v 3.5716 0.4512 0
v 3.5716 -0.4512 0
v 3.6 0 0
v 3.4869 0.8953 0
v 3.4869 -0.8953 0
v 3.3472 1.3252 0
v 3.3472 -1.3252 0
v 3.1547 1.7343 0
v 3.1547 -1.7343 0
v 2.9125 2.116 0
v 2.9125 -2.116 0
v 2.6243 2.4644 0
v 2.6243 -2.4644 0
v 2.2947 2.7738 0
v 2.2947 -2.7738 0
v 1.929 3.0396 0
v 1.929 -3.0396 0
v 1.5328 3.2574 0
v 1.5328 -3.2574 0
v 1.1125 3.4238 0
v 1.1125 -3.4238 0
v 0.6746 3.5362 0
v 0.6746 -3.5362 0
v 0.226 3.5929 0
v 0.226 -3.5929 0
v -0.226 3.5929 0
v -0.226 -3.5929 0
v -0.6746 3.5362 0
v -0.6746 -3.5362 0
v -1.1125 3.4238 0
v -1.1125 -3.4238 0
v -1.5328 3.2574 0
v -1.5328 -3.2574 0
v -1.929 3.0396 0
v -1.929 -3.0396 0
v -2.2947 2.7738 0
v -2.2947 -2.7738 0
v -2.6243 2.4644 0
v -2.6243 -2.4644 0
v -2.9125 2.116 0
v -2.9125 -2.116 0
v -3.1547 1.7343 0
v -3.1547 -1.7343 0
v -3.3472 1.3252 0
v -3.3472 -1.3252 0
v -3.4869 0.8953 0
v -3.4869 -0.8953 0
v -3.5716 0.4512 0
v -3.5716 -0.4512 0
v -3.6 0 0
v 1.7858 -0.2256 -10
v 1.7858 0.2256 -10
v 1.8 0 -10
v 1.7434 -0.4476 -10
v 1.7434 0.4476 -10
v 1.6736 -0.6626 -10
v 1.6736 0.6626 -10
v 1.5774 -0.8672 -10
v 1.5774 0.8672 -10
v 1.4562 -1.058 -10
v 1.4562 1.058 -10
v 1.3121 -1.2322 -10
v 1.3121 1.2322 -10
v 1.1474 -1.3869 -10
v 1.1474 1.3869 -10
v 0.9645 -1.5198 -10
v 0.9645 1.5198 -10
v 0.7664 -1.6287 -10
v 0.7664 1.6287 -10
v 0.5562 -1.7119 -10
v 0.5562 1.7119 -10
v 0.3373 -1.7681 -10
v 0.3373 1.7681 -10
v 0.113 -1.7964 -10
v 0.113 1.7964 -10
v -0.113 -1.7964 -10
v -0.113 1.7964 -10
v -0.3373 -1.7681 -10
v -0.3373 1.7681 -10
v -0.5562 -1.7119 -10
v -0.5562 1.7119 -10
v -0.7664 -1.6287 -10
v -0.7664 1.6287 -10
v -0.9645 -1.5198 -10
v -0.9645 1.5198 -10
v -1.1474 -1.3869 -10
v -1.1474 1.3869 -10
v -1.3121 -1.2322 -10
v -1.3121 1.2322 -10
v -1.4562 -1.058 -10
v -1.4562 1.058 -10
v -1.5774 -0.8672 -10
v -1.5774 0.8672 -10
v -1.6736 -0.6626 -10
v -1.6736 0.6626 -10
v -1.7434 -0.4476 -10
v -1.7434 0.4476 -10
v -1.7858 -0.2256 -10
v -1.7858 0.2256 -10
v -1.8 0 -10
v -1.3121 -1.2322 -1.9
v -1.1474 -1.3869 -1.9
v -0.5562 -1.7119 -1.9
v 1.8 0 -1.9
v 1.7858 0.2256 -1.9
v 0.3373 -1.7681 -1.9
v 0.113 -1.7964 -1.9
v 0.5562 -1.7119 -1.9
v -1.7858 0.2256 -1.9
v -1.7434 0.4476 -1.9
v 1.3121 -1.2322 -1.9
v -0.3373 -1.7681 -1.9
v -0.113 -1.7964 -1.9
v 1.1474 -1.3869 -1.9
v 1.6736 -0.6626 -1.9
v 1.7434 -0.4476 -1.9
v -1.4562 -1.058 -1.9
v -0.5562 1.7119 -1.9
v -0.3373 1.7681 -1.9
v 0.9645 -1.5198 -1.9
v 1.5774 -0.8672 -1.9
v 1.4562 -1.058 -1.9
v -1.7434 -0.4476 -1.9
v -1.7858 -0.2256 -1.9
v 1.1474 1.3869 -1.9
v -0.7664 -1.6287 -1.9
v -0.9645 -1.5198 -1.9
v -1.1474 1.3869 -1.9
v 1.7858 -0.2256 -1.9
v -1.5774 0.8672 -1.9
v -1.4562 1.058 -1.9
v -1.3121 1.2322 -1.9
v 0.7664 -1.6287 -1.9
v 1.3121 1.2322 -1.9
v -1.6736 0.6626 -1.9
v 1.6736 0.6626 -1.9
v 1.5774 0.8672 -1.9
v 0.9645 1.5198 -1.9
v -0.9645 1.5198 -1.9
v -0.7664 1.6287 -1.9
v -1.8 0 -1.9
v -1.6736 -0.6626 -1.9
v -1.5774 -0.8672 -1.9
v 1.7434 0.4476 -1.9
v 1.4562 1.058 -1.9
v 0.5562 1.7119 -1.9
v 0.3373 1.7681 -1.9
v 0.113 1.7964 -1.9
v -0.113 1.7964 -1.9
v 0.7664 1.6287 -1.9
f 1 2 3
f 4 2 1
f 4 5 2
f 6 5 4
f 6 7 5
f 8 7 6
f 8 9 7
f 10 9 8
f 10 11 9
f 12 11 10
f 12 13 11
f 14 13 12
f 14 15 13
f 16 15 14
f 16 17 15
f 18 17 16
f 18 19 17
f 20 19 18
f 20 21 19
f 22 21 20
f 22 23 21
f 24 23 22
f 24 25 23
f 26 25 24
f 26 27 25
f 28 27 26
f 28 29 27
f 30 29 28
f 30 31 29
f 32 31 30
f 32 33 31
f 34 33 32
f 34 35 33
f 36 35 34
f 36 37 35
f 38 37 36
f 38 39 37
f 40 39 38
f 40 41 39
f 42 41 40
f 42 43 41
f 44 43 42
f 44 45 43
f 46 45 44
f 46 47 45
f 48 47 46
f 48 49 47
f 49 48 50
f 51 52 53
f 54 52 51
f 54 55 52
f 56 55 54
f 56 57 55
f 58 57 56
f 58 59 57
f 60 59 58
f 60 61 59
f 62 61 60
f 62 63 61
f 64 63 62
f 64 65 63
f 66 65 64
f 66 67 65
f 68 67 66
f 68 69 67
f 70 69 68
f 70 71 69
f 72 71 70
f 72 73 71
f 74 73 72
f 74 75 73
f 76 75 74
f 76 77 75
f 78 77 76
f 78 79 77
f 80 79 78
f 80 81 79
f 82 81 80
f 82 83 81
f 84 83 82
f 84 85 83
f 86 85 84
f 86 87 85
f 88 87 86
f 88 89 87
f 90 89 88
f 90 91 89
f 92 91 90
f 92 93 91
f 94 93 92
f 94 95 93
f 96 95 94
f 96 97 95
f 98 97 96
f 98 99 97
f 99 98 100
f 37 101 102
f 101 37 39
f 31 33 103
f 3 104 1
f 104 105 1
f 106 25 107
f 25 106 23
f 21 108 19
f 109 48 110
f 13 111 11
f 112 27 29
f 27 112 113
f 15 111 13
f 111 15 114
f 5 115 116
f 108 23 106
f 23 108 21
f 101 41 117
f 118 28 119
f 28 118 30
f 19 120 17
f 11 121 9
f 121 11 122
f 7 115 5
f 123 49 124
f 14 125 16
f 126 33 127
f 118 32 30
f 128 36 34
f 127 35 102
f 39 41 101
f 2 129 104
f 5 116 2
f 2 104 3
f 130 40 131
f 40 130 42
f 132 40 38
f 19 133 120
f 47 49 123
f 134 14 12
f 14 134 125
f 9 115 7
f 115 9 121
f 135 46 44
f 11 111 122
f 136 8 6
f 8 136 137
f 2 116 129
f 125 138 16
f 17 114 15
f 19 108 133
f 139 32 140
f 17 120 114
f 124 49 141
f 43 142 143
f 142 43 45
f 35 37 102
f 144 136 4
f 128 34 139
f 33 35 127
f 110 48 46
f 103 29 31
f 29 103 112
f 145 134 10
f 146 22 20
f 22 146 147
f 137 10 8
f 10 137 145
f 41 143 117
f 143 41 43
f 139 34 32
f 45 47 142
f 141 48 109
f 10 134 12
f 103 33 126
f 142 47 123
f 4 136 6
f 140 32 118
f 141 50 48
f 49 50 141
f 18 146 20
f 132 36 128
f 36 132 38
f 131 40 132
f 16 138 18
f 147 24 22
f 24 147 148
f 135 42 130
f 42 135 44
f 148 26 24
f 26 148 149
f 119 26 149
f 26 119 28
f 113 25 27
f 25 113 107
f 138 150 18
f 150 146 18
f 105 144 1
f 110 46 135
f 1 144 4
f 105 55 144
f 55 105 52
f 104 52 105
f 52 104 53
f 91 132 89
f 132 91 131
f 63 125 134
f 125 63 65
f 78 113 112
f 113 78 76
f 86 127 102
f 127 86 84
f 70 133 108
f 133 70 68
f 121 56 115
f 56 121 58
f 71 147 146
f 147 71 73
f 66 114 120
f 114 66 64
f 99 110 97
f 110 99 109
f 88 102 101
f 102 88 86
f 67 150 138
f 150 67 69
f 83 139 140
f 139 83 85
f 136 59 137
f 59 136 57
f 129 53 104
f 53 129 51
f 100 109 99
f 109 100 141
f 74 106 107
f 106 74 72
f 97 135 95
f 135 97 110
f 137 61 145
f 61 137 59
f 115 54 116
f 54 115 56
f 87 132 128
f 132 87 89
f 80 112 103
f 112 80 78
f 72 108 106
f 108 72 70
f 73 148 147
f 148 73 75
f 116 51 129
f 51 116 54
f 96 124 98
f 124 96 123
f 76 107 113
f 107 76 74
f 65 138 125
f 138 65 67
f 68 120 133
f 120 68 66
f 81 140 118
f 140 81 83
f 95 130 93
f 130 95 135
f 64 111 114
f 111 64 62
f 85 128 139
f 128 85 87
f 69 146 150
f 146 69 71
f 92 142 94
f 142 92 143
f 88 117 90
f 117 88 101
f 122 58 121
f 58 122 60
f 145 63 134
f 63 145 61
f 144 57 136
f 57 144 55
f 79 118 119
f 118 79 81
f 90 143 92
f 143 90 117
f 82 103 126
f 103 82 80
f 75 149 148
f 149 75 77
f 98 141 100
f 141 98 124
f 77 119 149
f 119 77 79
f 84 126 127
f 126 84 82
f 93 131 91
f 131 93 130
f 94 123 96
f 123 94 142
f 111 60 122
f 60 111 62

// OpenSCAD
$fn = 50;


difference() {
	union() {
		translate(v = [0, 0, 0]) {
			rotate(a = [0, 0, 0]) {
				difference() {
					union() {
						translate(v = [0, 0, -10.0000000000]) {
							cylinder(h = 10, r = 1.5000000000);
						}
						translate(v = [0, 0, -1.9000000000]) {
							cylinder(h = 1.9000000000, r1 = 1.8000000000, r2 = 3.6000000000);
						}
						translate(v = [0, 0, -10.0000000000]) {
							cylinder(h = 10, r = 1.8000000000);
						}
						translate(v = [0, 0, -10.0000000000]) {
							cylinder(h = 10, r = 1.5000000000);
						}
					}
					union();
				}
			}
		}
	}
	union();
}
